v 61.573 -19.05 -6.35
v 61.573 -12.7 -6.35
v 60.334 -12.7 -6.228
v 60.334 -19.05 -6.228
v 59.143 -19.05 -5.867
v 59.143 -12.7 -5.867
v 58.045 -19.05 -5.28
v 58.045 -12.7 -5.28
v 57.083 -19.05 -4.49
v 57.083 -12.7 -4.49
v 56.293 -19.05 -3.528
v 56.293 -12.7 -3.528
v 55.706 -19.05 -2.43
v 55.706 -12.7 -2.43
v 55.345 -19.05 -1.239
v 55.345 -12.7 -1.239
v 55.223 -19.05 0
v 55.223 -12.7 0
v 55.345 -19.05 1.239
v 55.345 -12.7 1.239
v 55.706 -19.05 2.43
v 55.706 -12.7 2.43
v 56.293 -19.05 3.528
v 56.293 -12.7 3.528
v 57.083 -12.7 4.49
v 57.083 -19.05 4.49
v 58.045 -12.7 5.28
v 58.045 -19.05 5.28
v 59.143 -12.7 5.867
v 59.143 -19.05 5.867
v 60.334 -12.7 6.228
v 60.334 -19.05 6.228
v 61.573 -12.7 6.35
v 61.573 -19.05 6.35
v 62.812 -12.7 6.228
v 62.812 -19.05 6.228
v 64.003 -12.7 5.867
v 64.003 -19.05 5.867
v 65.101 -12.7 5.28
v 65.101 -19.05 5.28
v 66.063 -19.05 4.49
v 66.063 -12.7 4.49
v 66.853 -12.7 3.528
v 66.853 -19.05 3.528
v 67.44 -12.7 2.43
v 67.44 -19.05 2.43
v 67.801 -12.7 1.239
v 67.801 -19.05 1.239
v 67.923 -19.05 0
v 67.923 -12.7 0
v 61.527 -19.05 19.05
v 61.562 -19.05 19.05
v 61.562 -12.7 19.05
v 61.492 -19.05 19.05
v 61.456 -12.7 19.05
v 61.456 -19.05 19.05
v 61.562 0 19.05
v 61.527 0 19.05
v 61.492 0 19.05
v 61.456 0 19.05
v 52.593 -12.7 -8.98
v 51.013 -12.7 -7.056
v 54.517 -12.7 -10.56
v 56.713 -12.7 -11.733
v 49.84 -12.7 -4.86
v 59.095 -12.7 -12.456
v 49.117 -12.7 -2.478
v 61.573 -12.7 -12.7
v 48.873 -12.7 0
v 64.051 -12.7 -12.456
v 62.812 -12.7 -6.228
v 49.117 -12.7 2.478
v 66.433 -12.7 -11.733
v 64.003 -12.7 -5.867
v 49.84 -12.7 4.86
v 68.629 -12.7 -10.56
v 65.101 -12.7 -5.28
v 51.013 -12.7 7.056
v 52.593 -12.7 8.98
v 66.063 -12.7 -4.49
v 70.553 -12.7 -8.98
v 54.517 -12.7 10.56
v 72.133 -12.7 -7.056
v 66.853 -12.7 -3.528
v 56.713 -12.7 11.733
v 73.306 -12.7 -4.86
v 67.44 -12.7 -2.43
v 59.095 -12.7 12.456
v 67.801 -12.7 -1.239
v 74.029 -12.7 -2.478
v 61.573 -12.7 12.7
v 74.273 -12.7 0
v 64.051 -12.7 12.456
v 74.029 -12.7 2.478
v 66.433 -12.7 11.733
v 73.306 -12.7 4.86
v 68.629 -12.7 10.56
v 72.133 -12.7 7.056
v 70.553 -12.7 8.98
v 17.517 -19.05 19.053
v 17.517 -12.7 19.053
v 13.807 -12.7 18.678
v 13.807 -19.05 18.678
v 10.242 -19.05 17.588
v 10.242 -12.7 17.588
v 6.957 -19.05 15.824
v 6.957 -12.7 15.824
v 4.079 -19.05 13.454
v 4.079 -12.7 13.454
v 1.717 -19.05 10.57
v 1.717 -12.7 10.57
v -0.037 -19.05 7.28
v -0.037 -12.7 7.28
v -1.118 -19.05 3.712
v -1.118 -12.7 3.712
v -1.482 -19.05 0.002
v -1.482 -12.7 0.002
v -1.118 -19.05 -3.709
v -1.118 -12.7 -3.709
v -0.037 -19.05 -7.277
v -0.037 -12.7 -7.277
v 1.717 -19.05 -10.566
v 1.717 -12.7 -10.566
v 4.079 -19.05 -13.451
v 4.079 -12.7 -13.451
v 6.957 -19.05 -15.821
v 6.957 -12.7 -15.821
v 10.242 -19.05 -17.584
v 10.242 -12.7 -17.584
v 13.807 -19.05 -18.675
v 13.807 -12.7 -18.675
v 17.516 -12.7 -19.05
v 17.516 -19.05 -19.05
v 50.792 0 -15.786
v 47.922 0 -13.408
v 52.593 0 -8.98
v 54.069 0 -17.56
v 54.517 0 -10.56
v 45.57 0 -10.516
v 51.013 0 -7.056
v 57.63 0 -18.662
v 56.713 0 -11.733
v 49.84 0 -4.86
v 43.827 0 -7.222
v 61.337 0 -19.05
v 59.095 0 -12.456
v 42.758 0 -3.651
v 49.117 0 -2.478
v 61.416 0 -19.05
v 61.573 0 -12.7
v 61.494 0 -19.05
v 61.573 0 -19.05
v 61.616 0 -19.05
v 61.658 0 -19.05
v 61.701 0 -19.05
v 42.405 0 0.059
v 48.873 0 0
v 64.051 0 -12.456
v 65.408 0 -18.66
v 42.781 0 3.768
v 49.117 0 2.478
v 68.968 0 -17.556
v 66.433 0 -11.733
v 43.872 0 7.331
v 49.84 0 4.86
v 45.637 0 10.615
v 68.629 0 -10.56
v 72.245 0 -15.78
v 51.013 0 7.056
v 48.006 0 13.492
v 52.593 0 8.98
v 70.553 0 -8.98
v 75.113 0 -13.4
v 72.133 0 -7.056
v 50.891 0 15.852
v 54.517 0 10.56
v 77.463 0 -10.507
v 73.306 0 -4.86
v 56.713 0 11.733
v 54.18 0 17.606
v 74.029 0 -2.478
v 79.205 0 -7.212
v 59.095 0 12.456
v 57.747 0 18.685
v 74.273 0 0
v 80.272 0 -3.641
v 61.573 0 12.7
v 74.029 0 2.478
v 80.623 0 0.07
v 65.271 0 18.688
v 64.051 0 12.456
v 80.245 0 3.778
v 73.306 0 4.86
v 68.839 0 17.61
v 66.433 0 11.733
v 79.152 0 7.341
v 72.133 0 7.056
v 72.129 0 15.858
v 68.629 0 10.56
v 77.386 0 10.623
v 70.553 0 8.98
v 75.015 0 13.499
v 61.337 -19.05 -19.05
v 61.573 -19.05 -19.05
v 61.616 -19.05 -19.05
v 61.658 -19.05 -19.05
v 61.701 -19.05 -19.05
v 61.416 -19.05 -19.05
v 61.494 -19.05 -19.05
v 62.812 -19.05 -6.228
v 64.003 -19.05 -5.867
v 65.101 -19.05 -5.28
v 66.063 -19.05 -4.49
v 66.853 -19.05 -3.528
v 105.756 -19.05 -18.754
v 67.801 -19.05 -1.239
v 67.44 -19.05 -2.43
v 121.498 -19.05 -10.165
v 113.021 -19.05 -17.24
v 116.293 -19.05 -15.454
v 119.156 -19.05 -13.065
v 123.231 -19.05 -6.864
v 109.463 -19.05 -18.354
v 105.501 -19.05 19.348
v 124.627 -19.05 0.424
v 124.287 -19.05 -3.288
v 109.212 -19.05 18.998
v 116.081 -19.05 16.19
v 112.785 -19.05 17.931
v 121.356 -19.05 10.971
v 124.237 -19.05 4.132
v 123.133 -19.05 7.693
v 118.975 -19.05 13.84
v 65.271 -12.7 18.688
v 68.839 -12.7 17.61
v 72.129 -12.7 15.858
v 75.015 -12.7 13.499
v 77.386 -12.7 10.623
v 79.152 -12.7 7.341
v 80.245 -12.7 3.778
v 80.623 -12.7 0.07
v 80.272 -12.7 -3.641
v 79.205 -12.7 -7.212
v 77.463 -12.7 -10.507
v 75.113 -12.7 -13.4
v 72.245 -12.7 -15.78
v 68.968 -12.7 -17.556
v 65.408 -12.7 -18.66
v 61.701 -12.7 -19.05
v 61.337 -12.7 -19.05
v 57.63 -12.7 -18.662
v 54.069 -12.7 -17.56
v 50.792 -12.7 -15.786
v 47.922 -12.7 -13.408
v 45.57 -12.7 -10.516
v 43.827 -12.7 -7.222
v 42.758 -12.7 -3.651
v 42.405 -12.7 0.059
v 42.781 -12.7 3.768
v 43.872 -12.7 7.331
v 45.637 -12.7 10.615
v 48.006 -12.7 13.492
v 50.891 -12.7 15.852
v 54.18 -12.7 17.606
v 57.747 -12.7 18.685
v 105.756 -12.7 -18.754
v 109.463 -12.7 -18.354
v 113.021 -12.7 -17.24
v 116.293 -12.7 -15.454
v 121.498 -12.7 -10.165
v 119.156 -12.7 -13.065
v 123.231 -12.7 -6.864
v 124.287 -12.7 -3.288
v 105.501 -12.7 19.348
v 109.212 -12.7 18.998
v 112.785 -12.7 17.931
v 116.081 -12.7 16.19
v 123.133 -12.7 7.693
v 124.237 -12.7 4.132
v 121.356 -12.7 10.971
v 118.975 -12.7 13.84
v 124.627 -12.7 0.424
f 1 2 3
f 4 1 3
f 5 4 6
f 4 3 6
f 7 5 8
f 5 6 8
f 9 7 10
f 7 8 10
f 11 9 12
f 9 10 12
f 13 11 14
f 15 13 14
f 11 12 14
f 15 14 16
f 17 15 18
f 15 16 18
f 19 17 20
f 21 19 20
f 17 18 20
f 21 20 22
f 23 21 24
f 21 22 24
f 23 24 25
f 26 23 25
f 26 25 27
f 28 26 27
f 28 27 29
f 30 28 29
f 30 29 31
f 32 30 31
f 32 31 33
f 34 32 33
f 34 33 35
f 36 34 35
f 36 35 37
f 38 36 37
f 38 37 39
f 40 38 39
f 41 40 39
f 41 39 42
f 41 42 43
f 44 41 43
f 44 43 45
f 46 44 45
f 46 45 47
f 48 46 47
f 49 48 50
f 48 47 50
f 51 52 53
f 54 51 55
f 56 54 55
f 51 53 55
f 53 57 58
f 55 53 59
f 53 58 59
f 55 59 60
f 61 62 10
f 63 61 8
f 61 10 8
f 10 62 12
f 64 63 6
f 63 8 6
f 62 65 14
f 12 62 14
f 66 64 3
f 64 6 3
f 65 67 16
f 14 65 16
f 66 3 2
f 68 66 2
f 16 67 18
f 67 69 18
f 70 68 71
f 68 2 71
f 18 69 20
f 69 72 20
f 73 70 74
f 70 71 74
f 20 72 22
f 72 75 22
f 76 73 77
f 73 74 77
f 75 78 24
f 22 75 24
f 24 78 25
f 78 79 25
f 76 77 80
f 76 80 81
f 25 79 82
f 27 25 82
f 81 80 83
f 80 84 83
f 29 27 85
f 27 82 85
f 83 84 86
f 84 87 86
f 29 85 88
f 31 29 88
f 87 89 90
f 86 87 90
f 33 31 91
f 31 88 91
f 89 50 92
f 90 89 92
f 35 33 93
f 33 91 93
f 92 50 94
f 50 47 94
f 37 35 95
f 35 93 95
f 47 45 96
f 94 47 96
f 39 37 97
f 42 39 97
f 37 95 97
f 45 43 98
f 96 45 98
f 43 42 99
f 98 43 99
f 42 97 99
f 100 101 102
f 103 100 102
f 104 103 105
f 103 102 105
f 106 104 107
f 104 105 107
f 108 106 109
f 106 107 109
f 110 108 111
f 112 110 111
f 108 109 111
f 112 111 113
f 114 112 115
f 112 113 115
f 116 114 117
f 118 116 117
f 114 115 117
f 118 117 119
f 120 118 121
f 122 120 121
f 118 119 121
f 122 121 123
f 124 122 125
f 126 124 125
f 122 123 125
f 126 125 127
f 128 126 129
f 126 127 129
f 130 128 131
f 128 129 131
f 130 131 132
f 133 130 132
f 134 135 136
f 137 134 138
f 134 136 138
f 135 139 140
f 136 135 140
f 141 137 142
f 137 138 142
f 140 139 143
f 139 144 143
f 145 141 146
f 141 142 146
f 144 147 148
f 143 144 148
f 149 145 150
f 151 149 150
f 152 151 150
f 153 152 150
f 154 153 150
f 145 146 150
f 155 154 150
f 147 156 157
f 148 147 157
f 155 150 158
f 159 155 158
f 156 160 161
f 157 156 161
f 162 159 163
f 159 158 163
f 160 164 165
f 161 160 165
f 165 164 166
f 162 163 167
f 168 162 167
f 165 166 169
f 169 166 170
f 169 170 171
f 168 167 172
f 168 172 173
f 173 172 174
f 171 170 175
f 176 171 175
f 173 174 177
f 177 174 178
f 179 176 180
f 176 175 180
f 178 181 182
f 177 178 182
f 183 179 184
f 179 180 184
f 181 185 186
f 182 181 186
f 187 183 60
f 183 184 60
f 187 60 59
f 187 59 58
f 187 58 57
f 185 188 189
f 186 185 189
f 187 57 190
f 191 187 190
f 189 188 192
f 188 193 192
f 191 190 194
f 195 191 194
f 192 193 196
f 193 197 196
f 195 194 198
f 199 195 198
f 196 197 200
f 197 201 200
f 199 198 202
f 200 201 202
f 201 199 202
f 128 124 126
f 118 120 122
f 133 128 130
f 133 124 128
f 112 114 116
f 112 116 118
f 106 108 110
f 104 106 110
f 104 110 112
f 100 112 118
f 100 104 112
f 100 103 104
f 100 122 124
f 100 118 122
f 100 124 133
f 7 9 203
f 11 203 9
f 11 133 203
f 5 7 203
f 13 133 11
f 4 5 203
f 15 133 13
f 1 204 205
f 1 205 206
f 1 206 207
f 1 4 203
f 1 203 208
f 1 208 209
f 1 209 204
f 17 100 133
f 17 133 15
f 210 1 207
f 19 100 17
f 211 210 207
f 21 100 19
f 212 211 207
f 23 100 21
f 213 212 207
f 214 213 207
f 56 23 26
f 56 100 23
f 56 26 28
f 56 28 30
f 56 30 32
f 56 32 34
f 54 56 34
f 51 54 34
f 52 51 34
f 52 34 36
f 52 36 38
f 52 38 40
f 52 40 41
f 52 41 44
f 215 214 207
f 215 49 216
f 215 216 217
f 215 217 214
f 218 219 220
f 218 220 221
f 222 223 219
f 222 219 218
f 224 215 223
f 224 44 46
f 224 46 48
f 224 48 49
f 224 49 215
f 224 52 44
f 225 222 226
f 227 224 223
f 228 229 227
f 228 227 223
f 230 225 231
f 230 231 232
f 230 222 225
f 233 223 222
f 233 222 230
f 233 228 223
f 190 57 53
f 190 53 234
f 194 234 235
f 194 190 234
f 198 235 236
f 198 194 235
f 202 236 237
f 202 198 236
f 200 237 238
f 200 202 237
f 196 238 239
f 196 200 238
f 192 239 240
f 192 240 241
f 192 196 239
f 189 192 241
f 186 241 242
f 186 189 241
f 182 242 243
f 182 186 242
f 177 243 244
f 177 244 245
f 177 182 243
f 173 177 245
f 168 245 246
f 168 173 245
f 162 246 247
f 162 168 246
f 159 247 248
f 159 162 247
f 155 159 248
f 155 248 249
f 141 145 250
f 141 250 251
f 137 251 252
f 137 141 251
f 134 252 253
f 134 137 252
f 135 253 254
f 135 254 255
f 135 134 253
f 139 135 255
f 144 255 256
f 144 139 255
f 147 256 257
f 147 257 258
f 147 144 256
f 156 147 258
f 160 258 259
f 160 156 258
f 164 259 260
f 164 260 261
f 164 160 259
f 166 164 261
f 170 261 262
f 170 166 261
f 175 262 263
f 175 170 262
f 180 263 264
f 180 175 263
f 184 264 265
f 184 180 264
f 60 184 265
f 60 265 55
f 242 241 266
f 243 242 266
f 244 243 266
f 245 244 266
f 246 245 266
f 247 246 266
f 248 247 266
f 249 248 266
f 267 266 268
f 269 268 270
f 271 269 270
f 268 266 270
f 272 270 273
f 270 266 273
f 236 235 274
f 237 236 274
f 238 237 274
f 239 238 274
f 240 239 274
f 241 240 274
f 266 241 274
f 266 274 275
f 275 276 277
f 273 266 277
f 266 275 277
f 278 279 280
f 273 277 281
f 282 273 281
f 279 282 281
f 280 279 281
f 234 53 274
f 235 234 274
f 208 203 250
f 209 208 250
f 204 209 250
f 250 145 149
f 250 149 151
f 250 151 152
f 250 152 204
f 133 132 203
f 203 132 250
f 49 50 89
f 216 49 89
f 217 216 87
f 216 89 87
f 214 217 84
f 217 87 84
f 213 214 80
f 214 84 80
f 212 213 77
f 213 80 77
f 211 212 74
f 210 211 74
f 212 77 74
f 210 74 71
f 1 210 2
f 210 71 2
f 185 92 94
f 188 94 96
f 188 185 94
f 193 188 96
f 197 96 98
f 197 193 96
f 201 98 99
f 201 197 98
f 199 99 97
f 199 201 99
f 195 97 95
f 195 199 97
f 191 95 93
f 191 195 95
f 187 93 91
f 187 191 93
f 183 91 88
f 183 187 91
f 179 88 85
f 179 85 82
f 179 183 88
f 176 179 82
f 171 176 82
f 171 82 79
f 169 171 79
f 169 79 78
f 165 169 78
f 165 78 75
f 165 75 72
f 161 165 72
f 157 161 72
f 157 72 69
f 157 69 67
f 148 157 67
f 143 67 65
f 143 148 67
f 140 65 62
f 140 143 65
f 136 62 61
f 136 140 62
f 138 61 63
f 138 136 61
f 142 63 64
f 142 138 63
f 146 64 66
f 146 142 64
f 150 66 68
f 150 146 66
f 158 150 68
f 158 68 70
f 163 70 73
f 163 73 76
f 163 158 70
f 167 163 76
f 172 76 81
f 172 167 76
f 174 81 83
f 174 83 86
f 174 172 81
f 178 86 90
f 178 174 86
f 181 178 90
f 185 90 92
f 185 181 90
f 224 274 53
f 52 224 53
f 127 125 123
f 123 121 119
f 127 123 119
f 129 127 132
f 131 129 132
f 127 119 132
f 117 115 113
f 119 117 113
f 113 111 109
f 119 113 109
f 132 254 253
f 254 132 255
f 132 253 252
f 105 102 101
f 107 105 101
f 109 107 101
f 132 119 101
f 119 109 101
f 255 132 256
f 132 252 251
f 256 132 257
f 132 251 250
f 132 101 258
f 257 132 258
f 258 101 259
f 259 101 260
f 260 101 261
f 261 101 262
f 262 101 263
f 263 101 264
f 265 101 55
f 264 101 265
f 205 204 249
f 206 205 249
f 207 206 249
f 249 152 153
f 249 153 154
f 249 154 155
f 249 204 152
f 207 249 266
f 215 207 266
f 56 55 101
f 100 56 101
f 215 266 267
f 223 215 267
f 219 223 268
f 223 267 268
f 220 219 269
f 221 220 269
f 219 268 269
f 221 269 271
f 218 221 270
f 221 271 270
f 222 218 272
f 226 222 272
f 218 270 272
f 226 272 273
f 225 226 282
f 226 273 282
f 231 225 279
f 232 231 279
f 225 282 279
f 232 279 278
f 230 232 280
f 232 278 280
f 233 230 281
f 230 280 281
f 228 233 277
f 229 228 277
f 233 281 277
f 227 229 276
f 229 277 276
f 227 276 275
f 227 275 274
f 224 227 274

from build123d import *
from build123d import SkipClean  # not in build123d's __all__

# Parameters (mm, degrees)
F1_DEPTH = 19.05
F2_DEPTH = 12.7
F3_DEPTH = 12.7


with BuildPart() as f1:
    # F0 (on Front) → F1 (new body)
    with BuildSketch(Plane.XZ):
        with BuildLine():
            ThreePointArc((61.5727165116, -19.0499999988), (61.5728220467, -19.0499999997), (61.5729275818, -19.05))
            ThreePointArc((61.5729275818, -19.05), (61.6368837688, -19.0498926403), (61.7008392349, -19.0495705623))
            ThreePointArc((61.7008392349, -19.0495705623), (80.6228005597, 0.0695667009), (61.5617064856, 19.0499966952))
            ThreePointArc((61.5617064856, 19.0499966952), (61.5090769294, 19.0498929943), (61.4564478606, 19.0496438936))
            ThreePointArc((61.4564478606, 19.0496438936), (42.4051790983, 0.0593448366), (61.3370395323, -19.0499973876))
            Line((61.3370395323, -19.0499973876), (61.5727165116, -19.0499999988))
        make_face()
        with BuildLine():
            ThreePointArc((61.5729275818, -12.7), (52.5926714608, 8.9802561211), (74.2729275818, 0))
            ThreePointArc((74.2729275818, 0), (70.5531837029, -8.9802561211), (61.5729275818, -12.7))
        make_face(mode=Mode.SUBTRACT)
        with BuildLine():
            ThreePointArc((61.3370395323, -19.0499973876), (61.4548780179, -19.0503631562), (61.5727165116, -19.0499999988))
            Line((61.5727165116, -19.0499999988), (61.3370395323, -19.0499973876))
        make_face()
        with BuildLine():
            ThreePointArc((61.5617064856, 19.0499966952), (80.6228005597, 0.0695667009), (61.7008392349, -19.0495705623))
            Line((61.7008392349, -19.0495705623), (105.7561740171, -18.7537533585))
            ThreePointArc((105.7561740171, -18.7537533585), (124.6268697008, 0.4243875569), (105.5006242064, 19.3476794968))
            Line((105.5006242064, 19.3476794968), (61.5617064856, 19.0499966952))
        make_face()
        with BuildLine():
            Line((17.5163885853, -19.0495118633), (61.3370395323, -19.0499973876))
            ThreePointArc((61.3370395323, -19.0499973876), (42.4051790983, 0.0593448366), (61.4564478606, 19.0496438936))
            Line((61.4564478606, 19.0496438936), (17.516521874, 19.0527779802))
            ThreePointArc((17.516521874, 19.0527779802), (-1.4824426783, 0.0016995201), (17.5163885853, -19.0495118633))
        make_face()
        with BuildLine():
            ThreePointArc((61.5729275818, -12.7), (70.5531837029, -8.9802561211), (74.2729275818, 0))
            ThreePointArc((74.2729275818, 0), (52.5926714608, 8.9802561211), (61.5729275818, -12.7))
        make_face()
        with BuildLine():
            ThreePointArc((67.9229275818, 0), (66.0630556424, -4.4901280605), (61.5729275818, -6.35))
            ThreePointArc((61.5729275818, -6.35), (57.0827995213, 4.4901280605), (67.9229275818, 0))
        make_face(mode=Mode.SUBTRACT)
    extrude(amount=F1_DEPTH)

    # F0 (on Front) → F2 (cut)
    with BuildSketch(Plane.XZ):
        with BuildLine():
            ThreePointArc((61.5729275818, -12.7), (70.5531837029, -8.9802561211), (74.2729275818, 0))
            ThreePointArc((74.2729275818, 0), (52.5926714608, 8.9802561211), (61.5729275818, -12.7))
        make_face()
        with BuildLine():
            ThreePointArc((67.9229275818, 0), (66.0630556424, -4.4901280605), (61.5729275818, -6.35))
            ThreePointArc((61.5729275818, -6.35), (57.0827995213, 4.4901280605), (67.9229275818, 0))
        make_face(mode=Mode.SUBTRACT)
        with BuildLine():
            Line((17.5163885853, -19.0495118633), (61.3370395323, -19.0499973876))
            ThreePointArc((61.3370395323, -19.0499973876), (42.4051790983, 0.0593448366), (61.4564478606, 19.0496438936))
            Line((61.4564478606, 19.0496438936), (17.516521874, 19.0527779802))
            ThreePointArc((17.516521874, 19.0527779802), (-1.4824426783, 0.0016995201), (17.5163885853, -19.0495118633))
        make_face()
    extrude(amount=F2_DEPTH, mode=Mode.SUBTRACT)

    # F0 (on Front) → F3 (cut)
    with BuildSketch(Plane.XZ):
        with BuildLine():
            ThreePointArc((61.5617064856, 19.0499966952), (80.6228005597, 0.0695667009), (61.7008392349, -19.0495705623))
            Line((61.7008392349, -19.0495705623), (105.7561740171, -18.7537533585))
            ThreePointArc((105.7561740171, -18.7537533585), (124.6268697008, 0.4243875569), (105.5006242064, 19.3476794968))
            Line((105.5006242064, 19.3476794968), (61.5617064856, 19.0499966952))
        make_face()
    with SkipClean():  # cleaning this boolean's faces spoils the solid; the shape is the same uncleaned
        extrude(amount=F3_DEPTH, mode=Mode.SUBTRACT)


solid = f1.part
